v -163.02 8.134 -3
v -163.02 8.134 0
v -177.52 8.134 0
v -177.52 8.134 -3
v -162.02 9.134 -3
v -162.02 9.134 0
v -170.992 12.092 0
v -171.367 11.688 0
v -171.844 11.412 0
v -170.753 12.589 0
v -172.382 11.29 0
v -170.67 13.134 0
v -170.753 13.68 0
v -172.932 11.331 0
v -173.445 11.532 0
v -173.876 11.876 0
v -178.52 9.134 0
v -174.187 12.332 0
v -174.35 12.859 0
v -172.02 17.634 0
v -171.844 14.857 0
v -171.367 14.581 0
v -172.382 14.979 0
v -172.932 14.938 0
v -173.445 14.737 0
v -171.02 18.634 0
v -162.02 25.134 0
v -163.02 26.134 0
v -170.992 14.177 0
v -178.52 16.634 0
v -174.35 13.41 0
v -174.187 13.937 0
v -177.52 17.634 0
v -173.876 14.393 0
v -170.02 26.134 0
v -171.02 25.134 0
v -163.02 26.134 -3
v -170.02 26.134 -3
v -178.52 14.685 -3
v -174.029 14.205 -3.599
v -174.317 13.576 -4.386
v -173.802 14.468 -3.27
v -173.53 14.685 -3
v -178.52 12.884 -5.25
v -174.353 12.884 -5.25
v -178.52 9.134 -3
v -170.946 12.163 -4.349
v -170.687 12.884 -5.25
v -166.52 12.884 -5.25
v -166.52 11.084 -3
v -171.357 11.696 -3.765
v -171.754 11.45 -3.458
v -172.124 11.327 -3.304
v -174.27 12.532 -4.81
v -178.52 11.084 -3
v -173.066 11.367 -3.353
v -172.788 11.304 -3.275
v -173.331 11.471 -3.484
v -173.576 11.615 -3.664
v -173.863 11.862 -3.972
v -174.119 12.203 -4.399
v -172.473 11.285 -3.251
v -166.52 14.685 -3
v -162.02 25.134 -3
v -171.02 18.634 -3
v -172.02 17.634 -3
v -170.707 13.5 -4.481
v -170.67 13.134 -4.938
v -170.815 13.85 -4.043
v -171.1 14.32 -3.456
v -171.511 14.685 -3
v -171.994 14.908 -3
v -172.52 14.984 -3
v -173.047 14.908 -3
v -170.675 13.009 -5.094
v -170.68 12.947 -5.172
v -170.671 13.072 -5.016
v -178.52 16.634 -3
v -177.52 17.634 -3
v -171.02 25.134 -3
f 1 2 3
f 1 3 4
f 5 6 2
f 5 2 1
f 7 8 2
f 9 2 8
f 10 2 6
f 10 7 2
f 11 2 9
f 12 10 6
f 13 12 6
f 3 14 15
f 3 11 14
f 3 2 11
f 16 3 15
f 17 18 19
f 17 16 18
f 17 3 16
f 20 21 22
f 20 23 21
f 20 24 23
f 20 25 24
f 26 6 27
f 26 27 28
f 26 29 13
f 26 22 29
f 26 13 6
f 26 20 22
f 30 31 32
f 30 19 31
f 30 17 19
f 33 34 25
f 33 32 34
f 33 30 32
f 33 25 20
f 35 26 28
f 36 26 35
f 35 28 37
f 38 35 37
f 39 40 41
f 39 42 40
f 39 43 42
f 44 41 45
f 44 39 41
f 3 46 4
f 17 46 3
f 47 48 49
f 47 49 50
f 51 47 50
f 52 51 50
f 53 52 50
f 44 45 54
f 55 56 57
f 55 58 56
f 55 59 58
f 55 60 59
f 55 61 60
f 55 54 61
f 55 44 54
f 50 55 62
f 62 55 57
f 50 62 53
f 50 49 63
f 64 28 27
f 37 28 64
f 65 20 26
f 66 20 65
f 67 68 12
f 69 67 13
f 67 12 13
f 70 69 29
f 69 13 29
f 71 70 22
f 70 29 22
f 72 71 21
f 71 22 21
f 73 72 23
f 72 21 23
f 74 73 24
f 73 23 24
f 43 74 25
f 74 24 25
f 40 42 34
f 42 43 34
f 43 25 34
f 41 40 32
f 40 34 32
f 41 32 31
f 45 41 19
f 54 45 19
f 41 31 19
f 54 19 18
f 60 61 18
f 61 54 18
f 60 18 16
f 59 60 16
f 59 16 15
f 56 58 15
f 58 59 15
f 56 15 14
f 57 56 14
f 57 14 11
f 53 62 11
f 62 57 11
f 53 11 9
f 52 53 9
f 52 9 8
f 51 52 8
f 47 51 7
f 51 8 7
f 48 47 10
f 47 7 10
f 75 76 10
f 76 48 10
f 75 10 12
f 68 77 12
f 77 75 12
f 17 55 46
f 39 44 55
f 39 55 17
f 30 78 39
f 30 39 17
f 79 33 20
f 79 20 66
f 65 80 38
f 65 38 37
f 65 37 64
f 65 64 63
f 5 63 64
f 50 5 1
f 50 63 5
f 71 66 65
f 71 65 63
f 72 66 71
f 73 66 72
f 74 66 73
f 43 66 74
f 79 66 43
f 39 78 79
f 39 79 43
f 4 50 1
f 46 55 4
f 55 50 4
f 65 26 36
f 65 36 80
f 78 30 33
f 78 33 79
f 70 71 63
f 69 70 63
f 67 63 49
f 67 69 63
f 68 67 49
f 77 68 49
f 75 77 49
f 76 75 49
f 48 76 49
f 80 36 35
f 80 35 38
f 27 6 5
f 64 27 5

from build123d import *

# Parameters (mm, degrees)
BOSS_EXTRUDE3_DEPTH = 12
SKETCH5_W           = 3
SKETCH5_H           = 18
BOSS_EXTRUDE4_DEPTH = 4.5
CHAMFER1_SIZE       = 1
SKETCH4_R           = 1.85
CUT_EXTRUDE1_DEPTH  = 12


with BuildPart() as part:
    # Sketch3 → Boss-Extrude3 (new body)
    with BuildSketch(Plane.ZY.offset(178.52034041)):
        Polygon((-3, 14.684603209), (-5.250229512, 12.884419599), (-3, 11.084235989), (-3, 8.134419599), (0, 8.134419599), (0, 17.634419599), (-3, 17.634419599), align=None)
    extrude(amount=-BOSS_EXTRUDE3_DEPTH)

    # Sketch5 → Boss-Extrude4 (add, symmetric)
    with BuildSketch(Plane(origin=(-166.52034041, 0, 0), x_dir=(0, 0, -1), z_dir=(1, 0, 0))):
        with Locations((1.5, 17.134419599)):
            Rectangle(SKETCH5_W, SKETCH5_H)
    extrude(amount=BOSS_EXTRUDE4_DEPTH, both=True)

    # Chamfer1
    chamfer1_edges = [part.edges().sort_by_distance(p)[0] for p in [
        (-171.02034041, 17.634419599, -1.5),
        (-171.02034041, 26.134419599, -1.5),
        (-162.02034041, 8.134419599, -1.5),
        (-162.02034041, 26.134419599, -1.5),
        (-178.52034041, 17.634419599, -1.5),
        (-178.52034041, 8.134419599, -1.5),
    ]]
    chamfer(chamfer1_edges, length=CHAMFER1_SIZE)

    # Sketch4 → Cut-Extrude1 (cut)
    with BuildSketch(Plane.XY):
        with Locations((-172.52034041, 13.134419599)):
            Circle(SKETCH4_R)
    extrude(amount=-CUT_EXTRUDE1_DEPTH, mode=Mode.SUBTRACT)


solid = part.part
